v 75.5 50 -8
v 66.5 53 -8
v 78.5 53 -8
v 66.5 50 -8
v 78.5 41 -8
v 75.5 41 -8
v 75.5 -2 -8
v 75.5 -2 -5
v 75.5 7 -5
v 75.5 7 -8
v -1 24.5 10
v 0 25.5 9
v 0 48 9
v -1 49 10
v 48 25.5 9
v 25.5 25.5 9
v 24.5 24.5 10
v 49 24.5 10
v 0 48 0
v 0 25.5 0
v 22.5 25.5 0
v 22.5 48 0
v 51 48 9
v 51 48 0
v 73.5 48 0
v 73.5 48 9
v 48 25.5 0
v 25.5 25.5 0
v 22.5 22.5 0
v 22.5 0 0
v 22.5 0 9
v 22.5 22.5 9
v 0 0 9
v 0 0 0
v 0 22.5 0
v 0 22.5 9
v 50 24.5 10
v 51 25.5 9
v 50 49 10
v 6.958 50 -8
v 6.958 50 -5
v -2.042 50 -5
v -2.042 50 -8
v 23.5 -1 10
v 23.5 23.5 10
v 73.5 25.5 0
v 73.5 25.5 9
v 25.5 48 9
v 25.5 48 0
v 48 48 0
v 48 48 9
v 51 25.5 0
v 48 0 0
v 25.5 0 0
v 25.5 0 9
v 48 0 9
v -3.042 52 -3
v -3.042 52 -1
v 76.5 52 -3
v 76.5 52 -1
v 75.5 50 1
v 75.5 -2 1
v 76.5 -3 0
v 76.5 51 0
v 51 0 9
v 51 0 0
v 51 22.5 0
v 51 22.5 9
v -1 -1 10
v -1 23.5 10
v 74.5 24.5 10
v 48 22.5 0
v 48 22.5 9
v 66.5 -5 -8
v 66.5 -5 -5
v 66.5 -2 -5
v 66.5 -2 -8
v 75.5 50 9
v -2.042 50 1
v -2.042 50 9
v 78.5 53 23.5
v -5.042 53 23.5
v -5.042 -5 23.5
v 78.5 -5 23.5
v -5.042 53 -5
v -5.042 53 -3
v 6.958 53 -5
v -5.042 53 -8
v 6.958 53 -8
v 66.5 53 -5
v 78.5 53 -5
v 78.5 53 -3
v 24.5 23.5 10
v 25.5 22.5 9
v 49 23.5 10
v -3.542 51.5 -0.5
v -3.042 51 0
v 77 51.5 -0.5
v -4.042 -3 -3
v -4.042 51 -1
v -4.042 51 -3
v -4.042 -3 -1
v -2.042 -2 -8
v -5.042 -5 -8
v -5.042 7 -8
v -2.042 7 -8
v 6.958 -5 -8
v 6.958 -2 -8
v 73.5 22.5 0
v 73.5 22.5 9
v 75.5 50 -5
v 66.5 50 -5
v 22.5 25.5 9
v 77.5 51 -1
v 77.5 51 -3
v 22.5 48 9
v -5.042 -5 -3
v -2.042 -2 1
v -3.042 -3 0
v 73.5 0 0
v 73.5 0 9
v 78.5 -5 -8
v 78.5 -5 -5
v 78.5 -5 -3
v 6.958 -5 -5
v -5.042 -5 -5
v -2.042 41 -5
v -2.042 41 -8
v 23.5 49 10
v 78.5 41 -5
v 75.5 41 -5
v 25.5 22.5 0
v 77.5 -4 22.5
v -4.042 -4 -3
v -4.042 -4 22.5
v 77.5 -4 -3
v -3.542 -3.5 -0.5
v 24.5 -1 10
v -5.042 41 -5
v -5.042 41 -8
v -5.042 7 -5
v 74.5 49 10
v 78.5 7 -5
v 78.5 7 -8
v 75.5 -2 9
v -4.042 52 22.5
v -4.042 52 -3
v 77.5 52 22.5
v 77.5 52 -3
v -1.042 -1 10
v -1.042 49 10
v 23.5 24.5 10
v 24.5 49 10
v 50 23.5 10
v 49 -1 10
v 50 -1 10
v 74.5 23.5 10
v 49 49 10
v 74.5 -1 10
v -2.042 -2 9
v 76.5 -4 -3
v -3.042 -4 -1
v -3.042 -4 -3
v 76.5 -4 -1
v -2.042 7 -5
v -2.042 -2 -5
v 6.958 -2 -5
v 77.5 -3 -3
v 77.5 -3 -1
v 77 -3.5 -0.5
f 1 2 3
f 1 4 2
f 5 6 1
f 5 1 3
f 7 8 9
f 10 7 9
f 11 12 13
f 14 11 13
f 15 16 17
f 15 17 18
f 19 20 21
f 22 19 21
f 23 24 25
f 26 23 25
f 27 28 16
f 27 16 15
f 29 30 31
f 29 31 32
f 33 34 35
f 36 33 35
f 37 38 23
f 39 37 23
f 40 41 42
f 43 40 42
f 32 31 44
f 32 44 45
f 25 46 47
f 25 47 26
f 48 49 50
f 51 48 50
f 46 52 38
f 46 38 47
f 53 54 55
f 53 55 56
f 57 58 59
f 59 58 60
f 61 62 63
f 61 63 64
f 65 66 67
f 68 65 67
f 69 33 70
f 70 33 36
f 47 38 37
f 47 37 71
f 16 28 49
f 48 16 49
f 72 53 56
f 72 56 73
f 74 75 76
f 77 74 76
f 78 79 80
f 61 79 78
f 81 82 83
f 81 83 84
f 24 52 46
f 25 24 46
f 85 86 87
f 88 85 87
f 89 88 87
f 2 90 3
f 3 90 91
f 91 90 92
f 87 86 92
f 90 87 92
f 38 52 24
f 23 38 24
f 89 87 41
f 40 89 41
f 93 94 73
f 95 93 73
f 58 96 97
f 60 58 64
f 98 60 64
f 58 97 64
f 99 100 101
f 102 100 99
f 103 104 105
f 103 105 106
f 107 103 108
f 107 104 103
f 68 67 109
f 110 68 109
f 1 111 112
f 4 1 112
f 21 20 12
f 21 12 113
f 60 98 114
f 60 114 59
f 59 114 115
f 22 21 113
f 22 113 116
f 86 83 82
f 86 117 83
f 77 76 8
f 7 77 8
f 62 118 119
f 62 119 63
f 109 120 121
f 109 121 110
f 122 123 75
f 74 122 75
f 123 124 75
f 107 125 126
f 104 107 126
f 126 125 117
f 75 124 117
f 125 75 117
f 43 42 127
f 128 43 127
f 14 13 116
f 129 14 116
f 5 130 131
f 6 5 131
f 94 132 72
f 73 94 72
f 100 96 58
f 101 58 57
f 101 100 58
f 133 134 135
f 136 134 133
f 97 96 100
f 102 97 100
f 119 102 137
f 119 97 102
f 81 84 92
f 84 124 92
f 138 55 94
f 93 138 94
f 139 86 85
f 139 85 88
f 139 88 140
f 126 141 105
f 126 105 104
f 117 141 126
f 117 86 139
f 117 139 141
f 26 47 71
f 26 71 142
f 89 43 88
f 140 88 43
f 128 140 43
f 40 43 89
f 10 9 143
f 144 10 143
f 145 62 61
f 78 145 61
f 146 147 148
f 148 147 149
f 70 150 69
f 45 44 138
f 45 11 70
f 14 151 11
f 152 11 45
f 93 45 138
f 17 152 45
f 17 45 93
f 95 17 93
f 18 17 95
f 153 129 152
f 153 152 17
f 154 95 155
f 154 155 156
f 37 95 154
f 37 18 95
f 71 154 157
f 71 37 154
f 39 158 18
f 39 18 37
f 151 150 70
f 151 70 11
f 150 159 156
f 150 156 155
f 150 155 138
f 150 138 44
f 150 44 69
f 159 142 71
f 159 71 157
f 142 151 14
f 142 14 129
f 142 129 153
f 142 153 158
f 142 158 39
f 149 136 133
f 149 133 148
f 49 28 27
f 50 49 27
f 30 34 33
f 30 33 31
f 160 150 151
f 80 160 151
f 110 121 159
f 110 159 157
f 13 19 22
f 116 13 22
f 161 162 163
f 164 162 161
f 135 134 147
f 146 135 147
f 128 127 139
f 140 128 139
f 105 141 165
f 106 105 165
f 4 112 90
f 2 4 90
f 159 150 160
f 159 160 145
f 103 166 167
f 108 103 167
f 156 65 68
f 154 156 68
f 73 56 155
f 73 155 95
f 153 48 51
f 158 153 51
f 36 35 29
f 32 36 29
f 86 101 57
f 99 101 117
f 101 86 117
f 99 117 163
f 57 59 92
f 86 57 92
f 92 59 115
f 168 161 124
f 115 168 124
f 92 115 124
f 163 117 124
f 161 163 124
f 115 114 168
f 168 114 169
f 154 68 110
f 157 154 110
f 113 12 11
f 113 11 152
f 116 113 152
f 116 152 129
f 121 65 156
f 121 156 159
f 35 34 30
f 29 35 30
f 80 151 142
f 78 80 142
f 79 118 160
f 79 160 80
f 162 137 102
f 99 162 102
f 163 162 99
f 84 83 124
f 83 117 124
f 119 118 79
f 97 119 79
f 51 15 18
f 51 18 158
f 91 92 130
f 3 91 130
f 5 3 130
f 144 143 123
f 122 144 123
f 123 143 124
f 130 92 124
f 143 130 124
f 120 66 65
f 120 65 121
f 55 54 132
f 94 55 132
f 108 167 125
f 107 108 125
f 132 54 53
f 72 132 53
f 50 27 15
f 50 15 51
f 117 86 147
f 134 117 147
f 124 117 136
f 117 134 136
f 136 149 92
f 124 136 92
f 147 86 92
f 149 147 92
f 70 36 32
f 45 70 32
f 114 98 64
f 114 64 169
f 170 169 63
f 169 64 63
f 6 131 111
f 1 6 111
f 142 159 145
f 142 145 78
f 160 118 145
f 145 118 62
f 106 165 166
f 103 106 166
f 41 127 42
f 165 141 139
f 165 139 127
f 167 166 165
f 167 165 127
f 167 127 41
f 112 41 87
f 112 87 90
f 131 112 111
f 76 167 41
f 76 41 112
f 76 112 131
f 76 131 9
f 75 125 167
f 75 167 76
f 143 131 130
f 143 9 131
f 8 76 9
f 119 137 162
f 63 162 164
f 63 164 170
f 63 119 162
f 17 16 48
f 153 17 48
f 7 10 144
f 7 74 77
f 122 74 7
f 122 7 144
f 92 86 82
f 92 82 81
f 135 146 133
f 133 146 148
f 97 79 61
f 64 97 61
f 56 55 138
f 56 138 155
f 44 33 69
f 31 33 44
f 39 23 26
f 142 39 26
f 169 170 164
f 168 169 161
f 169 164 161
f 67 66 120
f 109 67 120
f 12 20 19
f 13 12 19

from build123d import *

# Parameters (mm, degrees)
F0_W      = 77.5417897031
F0_H      = 52
F0_W_2    = 22.5
F0_H_2    = 22.5
F1_DEPTH  = 10
F2_W      = 81.5417897031
F2_H      = 56
F3_DEPTH  = 3
F4_W      = 83.5417897031
F4_H      = 58
F5_DEPTH  = 2
F6_SIZE   = 1
F7_SIZE   = 0.99999
F9_DEPTH  = 3
F10_W     = 83.5417897031
F10_H     = 58
F10_W_2   = 81.5417897031
F10_H_2   = 56
F11_DEPTH = 25.5
F12_W     = 83.5417897031
F12_H     = 58
F13_DEPTH = 1


# Not quite as in the source:
# - a fillet or chamfer is up to 0.001 mm smaller than in the source, because OpenCascade refuses the exact size


with BuildPart() as f1:
    # F0 (on Top) → F1 (new body)
    with BuildSketch(Plane.XY):
        with Locations((36.7291051485, 24)):
            Rectangle(F0_W, F0_H)
        with Locations((11.25, 11.25)):
            Rectangle(F0_W_2, F0_H_2, mode=Mode.SUBTRACT)
        with Locations((36.75, 11.25)):
            Rectangle(F0_W_2, F0_H_2, mode=Mode.SUBTRACT)
        with Locations((62.25, 11.25)):
            Rectangle(F0_W_2, F0_H_2, mode=Mode.SUBTRACT)
        with Locations((11.25, 36.75)):
            Rectangle(F0_W_2, F0_H_2, mode=Mode.SUBTRACT)
        with Locations((36.75, 36.75)):
            Rectangle(F0_W_2, F0_H_2, mode=Mode.SUBTRACT)
        with Locations((62.25, 36.75)):
            Rectangle(F0_W_2, F0_H_2, mode=Mode.SUBTRACT)
    extrude(amount=F1_DEPTH)

    # F2 (on face) → F3 (join)
    with BuildSketch(Plane(origin=(0, 0, 0), x_dir=(1, 0, 0), z_dir=(0, 0, -1))):
        with Locations((36.7291051485, -24)):
            Rectangle(F2_W, F2_H)
    extrude(amount=F3_DEPTH)

    # F4 (on face) → F5 (join)
    with BuildSketch(Plane(origin=(0, 0, -3), x_dir=(1, 0, 0), z_dir=(0, 0, -1))):
        with Locations((36.7291051485, -24)):
            Rectangle(F4_W, F4_H)
    extrude(amount=F5_DEPTH)

    # F6
    f6_edges = [f1.edges().sort_by_distance(p)[0] for p in [
        (77.5, 24, 0),
        (36.729105, 52, 0),
        (-4.04179, 24, 0),
        (36.729105, -4, 0),
    ]]
    chamfer(f6_edges, length=F6_SIZE)

    # F7 (size 1 in the source; OpenCascade refuses exactly that, so slightly less here)
    f7_edges = [f1.edges().sort_by_distance(p)[0] for p in [
        (22.5, 11.25, 10),
        (11.25, 0, 10),
        (0, 11.25, 10),
        (11.25, 22.5, 10),
        (48, 11.25, 10),
        (36.75, 0, 10),
        (25.5, 11.25, 10),
        (36.75, 22.5, 10),
        (62.25, 22.5, 10),
        (73.5, 11.25, 10),
        (62.25, 0, 10),
        (51, 11.25, 10),
        (62.25, 25.5, 10),
        (73.5, 36.75, 10),
        (62.25, 48, 10),
        (51, 36.75, 10),
        (36.75, 25.5, 10),
        (48, 36.75, 10),
        (36.75, 48, 10),
        (22.5, 36.75, 10),
        (11.25, 25.5, 10),
        (0, 36.75, 10),
        (-2.04179, 24, 10),
        (36.729105, -2, 10),
        (75.5, 24, 10),
        (36.729105, 50, 10),
        (11.25, 48, 10),
        (25.5, 36.75, 10),
        (36.729105, 50, 0),
        (-2.04179, 24, 0),
        (75.5, 24, 0),
        (36.729105, -2, 0),
        (-4.04179, -4, -2),
        (-4.04179, 52, -2),
        (77.5, 52, -2),
        (77.5, -4, -2),
    ]]
    chamfer(f7_edges, length=F7_SIZE)

    # F8 (on face) → F9 (join)
    with BuildSketch(Plane(origin=(0, 0, -5), x_dir=(1, 0, 0), z_dir=(0, 0, -1))):
        Polygon((75.5, -7), (78.5, -7), (78.5, 5), (66.5, 5), (66.5, 2), (75.5, 2), align=None)
        Polygon((66.5, -53), (78.5, -53), (78.5, -41), (75.5, -41), (75.5, -50), (66.5, -50), align=None)
        Polygon((-5.0417897031, -53), (6.9582102969, -53), (6.9582102969, -50), (-2.0417897031, -50), (-2.0417897031, -41), (-5.0417897031, -41), align=None)
        Polygon((6.9582102969, 2), (6.9582102969, 5), (-5.0417897031, 5), (-5.0417897031, -7), (-2.0417897031, -7), (-2.0417897031, 2), align=None)
    extrude(amount=F9_DEPTH)


with BuildPart() as f11:
    # F10 (on face) → F11 (new body)
    with BuildSketch(Plane.XY.offset(-3)):
        with Locations((36.7291051485, 24)):
            Rectangle(F10_W, F10_H)
        with Locations((36.7291051485, 24)):
            Rectangle(F10_W_2, F10_H_2, mode=Mode.SUBTRACT)
    extrude(amount=F11_DEPTH)

    # F12 (on face) → F13 (join)
    with BuildSketch(Plane.XY.offset(22.5)):
        with Locations((36.7291051485, 24)):
            Rectangle(F12_W, F12_H)
    extrude(amount=F13_DEPTH)


solid = Compound([f1.part, f11.part])
